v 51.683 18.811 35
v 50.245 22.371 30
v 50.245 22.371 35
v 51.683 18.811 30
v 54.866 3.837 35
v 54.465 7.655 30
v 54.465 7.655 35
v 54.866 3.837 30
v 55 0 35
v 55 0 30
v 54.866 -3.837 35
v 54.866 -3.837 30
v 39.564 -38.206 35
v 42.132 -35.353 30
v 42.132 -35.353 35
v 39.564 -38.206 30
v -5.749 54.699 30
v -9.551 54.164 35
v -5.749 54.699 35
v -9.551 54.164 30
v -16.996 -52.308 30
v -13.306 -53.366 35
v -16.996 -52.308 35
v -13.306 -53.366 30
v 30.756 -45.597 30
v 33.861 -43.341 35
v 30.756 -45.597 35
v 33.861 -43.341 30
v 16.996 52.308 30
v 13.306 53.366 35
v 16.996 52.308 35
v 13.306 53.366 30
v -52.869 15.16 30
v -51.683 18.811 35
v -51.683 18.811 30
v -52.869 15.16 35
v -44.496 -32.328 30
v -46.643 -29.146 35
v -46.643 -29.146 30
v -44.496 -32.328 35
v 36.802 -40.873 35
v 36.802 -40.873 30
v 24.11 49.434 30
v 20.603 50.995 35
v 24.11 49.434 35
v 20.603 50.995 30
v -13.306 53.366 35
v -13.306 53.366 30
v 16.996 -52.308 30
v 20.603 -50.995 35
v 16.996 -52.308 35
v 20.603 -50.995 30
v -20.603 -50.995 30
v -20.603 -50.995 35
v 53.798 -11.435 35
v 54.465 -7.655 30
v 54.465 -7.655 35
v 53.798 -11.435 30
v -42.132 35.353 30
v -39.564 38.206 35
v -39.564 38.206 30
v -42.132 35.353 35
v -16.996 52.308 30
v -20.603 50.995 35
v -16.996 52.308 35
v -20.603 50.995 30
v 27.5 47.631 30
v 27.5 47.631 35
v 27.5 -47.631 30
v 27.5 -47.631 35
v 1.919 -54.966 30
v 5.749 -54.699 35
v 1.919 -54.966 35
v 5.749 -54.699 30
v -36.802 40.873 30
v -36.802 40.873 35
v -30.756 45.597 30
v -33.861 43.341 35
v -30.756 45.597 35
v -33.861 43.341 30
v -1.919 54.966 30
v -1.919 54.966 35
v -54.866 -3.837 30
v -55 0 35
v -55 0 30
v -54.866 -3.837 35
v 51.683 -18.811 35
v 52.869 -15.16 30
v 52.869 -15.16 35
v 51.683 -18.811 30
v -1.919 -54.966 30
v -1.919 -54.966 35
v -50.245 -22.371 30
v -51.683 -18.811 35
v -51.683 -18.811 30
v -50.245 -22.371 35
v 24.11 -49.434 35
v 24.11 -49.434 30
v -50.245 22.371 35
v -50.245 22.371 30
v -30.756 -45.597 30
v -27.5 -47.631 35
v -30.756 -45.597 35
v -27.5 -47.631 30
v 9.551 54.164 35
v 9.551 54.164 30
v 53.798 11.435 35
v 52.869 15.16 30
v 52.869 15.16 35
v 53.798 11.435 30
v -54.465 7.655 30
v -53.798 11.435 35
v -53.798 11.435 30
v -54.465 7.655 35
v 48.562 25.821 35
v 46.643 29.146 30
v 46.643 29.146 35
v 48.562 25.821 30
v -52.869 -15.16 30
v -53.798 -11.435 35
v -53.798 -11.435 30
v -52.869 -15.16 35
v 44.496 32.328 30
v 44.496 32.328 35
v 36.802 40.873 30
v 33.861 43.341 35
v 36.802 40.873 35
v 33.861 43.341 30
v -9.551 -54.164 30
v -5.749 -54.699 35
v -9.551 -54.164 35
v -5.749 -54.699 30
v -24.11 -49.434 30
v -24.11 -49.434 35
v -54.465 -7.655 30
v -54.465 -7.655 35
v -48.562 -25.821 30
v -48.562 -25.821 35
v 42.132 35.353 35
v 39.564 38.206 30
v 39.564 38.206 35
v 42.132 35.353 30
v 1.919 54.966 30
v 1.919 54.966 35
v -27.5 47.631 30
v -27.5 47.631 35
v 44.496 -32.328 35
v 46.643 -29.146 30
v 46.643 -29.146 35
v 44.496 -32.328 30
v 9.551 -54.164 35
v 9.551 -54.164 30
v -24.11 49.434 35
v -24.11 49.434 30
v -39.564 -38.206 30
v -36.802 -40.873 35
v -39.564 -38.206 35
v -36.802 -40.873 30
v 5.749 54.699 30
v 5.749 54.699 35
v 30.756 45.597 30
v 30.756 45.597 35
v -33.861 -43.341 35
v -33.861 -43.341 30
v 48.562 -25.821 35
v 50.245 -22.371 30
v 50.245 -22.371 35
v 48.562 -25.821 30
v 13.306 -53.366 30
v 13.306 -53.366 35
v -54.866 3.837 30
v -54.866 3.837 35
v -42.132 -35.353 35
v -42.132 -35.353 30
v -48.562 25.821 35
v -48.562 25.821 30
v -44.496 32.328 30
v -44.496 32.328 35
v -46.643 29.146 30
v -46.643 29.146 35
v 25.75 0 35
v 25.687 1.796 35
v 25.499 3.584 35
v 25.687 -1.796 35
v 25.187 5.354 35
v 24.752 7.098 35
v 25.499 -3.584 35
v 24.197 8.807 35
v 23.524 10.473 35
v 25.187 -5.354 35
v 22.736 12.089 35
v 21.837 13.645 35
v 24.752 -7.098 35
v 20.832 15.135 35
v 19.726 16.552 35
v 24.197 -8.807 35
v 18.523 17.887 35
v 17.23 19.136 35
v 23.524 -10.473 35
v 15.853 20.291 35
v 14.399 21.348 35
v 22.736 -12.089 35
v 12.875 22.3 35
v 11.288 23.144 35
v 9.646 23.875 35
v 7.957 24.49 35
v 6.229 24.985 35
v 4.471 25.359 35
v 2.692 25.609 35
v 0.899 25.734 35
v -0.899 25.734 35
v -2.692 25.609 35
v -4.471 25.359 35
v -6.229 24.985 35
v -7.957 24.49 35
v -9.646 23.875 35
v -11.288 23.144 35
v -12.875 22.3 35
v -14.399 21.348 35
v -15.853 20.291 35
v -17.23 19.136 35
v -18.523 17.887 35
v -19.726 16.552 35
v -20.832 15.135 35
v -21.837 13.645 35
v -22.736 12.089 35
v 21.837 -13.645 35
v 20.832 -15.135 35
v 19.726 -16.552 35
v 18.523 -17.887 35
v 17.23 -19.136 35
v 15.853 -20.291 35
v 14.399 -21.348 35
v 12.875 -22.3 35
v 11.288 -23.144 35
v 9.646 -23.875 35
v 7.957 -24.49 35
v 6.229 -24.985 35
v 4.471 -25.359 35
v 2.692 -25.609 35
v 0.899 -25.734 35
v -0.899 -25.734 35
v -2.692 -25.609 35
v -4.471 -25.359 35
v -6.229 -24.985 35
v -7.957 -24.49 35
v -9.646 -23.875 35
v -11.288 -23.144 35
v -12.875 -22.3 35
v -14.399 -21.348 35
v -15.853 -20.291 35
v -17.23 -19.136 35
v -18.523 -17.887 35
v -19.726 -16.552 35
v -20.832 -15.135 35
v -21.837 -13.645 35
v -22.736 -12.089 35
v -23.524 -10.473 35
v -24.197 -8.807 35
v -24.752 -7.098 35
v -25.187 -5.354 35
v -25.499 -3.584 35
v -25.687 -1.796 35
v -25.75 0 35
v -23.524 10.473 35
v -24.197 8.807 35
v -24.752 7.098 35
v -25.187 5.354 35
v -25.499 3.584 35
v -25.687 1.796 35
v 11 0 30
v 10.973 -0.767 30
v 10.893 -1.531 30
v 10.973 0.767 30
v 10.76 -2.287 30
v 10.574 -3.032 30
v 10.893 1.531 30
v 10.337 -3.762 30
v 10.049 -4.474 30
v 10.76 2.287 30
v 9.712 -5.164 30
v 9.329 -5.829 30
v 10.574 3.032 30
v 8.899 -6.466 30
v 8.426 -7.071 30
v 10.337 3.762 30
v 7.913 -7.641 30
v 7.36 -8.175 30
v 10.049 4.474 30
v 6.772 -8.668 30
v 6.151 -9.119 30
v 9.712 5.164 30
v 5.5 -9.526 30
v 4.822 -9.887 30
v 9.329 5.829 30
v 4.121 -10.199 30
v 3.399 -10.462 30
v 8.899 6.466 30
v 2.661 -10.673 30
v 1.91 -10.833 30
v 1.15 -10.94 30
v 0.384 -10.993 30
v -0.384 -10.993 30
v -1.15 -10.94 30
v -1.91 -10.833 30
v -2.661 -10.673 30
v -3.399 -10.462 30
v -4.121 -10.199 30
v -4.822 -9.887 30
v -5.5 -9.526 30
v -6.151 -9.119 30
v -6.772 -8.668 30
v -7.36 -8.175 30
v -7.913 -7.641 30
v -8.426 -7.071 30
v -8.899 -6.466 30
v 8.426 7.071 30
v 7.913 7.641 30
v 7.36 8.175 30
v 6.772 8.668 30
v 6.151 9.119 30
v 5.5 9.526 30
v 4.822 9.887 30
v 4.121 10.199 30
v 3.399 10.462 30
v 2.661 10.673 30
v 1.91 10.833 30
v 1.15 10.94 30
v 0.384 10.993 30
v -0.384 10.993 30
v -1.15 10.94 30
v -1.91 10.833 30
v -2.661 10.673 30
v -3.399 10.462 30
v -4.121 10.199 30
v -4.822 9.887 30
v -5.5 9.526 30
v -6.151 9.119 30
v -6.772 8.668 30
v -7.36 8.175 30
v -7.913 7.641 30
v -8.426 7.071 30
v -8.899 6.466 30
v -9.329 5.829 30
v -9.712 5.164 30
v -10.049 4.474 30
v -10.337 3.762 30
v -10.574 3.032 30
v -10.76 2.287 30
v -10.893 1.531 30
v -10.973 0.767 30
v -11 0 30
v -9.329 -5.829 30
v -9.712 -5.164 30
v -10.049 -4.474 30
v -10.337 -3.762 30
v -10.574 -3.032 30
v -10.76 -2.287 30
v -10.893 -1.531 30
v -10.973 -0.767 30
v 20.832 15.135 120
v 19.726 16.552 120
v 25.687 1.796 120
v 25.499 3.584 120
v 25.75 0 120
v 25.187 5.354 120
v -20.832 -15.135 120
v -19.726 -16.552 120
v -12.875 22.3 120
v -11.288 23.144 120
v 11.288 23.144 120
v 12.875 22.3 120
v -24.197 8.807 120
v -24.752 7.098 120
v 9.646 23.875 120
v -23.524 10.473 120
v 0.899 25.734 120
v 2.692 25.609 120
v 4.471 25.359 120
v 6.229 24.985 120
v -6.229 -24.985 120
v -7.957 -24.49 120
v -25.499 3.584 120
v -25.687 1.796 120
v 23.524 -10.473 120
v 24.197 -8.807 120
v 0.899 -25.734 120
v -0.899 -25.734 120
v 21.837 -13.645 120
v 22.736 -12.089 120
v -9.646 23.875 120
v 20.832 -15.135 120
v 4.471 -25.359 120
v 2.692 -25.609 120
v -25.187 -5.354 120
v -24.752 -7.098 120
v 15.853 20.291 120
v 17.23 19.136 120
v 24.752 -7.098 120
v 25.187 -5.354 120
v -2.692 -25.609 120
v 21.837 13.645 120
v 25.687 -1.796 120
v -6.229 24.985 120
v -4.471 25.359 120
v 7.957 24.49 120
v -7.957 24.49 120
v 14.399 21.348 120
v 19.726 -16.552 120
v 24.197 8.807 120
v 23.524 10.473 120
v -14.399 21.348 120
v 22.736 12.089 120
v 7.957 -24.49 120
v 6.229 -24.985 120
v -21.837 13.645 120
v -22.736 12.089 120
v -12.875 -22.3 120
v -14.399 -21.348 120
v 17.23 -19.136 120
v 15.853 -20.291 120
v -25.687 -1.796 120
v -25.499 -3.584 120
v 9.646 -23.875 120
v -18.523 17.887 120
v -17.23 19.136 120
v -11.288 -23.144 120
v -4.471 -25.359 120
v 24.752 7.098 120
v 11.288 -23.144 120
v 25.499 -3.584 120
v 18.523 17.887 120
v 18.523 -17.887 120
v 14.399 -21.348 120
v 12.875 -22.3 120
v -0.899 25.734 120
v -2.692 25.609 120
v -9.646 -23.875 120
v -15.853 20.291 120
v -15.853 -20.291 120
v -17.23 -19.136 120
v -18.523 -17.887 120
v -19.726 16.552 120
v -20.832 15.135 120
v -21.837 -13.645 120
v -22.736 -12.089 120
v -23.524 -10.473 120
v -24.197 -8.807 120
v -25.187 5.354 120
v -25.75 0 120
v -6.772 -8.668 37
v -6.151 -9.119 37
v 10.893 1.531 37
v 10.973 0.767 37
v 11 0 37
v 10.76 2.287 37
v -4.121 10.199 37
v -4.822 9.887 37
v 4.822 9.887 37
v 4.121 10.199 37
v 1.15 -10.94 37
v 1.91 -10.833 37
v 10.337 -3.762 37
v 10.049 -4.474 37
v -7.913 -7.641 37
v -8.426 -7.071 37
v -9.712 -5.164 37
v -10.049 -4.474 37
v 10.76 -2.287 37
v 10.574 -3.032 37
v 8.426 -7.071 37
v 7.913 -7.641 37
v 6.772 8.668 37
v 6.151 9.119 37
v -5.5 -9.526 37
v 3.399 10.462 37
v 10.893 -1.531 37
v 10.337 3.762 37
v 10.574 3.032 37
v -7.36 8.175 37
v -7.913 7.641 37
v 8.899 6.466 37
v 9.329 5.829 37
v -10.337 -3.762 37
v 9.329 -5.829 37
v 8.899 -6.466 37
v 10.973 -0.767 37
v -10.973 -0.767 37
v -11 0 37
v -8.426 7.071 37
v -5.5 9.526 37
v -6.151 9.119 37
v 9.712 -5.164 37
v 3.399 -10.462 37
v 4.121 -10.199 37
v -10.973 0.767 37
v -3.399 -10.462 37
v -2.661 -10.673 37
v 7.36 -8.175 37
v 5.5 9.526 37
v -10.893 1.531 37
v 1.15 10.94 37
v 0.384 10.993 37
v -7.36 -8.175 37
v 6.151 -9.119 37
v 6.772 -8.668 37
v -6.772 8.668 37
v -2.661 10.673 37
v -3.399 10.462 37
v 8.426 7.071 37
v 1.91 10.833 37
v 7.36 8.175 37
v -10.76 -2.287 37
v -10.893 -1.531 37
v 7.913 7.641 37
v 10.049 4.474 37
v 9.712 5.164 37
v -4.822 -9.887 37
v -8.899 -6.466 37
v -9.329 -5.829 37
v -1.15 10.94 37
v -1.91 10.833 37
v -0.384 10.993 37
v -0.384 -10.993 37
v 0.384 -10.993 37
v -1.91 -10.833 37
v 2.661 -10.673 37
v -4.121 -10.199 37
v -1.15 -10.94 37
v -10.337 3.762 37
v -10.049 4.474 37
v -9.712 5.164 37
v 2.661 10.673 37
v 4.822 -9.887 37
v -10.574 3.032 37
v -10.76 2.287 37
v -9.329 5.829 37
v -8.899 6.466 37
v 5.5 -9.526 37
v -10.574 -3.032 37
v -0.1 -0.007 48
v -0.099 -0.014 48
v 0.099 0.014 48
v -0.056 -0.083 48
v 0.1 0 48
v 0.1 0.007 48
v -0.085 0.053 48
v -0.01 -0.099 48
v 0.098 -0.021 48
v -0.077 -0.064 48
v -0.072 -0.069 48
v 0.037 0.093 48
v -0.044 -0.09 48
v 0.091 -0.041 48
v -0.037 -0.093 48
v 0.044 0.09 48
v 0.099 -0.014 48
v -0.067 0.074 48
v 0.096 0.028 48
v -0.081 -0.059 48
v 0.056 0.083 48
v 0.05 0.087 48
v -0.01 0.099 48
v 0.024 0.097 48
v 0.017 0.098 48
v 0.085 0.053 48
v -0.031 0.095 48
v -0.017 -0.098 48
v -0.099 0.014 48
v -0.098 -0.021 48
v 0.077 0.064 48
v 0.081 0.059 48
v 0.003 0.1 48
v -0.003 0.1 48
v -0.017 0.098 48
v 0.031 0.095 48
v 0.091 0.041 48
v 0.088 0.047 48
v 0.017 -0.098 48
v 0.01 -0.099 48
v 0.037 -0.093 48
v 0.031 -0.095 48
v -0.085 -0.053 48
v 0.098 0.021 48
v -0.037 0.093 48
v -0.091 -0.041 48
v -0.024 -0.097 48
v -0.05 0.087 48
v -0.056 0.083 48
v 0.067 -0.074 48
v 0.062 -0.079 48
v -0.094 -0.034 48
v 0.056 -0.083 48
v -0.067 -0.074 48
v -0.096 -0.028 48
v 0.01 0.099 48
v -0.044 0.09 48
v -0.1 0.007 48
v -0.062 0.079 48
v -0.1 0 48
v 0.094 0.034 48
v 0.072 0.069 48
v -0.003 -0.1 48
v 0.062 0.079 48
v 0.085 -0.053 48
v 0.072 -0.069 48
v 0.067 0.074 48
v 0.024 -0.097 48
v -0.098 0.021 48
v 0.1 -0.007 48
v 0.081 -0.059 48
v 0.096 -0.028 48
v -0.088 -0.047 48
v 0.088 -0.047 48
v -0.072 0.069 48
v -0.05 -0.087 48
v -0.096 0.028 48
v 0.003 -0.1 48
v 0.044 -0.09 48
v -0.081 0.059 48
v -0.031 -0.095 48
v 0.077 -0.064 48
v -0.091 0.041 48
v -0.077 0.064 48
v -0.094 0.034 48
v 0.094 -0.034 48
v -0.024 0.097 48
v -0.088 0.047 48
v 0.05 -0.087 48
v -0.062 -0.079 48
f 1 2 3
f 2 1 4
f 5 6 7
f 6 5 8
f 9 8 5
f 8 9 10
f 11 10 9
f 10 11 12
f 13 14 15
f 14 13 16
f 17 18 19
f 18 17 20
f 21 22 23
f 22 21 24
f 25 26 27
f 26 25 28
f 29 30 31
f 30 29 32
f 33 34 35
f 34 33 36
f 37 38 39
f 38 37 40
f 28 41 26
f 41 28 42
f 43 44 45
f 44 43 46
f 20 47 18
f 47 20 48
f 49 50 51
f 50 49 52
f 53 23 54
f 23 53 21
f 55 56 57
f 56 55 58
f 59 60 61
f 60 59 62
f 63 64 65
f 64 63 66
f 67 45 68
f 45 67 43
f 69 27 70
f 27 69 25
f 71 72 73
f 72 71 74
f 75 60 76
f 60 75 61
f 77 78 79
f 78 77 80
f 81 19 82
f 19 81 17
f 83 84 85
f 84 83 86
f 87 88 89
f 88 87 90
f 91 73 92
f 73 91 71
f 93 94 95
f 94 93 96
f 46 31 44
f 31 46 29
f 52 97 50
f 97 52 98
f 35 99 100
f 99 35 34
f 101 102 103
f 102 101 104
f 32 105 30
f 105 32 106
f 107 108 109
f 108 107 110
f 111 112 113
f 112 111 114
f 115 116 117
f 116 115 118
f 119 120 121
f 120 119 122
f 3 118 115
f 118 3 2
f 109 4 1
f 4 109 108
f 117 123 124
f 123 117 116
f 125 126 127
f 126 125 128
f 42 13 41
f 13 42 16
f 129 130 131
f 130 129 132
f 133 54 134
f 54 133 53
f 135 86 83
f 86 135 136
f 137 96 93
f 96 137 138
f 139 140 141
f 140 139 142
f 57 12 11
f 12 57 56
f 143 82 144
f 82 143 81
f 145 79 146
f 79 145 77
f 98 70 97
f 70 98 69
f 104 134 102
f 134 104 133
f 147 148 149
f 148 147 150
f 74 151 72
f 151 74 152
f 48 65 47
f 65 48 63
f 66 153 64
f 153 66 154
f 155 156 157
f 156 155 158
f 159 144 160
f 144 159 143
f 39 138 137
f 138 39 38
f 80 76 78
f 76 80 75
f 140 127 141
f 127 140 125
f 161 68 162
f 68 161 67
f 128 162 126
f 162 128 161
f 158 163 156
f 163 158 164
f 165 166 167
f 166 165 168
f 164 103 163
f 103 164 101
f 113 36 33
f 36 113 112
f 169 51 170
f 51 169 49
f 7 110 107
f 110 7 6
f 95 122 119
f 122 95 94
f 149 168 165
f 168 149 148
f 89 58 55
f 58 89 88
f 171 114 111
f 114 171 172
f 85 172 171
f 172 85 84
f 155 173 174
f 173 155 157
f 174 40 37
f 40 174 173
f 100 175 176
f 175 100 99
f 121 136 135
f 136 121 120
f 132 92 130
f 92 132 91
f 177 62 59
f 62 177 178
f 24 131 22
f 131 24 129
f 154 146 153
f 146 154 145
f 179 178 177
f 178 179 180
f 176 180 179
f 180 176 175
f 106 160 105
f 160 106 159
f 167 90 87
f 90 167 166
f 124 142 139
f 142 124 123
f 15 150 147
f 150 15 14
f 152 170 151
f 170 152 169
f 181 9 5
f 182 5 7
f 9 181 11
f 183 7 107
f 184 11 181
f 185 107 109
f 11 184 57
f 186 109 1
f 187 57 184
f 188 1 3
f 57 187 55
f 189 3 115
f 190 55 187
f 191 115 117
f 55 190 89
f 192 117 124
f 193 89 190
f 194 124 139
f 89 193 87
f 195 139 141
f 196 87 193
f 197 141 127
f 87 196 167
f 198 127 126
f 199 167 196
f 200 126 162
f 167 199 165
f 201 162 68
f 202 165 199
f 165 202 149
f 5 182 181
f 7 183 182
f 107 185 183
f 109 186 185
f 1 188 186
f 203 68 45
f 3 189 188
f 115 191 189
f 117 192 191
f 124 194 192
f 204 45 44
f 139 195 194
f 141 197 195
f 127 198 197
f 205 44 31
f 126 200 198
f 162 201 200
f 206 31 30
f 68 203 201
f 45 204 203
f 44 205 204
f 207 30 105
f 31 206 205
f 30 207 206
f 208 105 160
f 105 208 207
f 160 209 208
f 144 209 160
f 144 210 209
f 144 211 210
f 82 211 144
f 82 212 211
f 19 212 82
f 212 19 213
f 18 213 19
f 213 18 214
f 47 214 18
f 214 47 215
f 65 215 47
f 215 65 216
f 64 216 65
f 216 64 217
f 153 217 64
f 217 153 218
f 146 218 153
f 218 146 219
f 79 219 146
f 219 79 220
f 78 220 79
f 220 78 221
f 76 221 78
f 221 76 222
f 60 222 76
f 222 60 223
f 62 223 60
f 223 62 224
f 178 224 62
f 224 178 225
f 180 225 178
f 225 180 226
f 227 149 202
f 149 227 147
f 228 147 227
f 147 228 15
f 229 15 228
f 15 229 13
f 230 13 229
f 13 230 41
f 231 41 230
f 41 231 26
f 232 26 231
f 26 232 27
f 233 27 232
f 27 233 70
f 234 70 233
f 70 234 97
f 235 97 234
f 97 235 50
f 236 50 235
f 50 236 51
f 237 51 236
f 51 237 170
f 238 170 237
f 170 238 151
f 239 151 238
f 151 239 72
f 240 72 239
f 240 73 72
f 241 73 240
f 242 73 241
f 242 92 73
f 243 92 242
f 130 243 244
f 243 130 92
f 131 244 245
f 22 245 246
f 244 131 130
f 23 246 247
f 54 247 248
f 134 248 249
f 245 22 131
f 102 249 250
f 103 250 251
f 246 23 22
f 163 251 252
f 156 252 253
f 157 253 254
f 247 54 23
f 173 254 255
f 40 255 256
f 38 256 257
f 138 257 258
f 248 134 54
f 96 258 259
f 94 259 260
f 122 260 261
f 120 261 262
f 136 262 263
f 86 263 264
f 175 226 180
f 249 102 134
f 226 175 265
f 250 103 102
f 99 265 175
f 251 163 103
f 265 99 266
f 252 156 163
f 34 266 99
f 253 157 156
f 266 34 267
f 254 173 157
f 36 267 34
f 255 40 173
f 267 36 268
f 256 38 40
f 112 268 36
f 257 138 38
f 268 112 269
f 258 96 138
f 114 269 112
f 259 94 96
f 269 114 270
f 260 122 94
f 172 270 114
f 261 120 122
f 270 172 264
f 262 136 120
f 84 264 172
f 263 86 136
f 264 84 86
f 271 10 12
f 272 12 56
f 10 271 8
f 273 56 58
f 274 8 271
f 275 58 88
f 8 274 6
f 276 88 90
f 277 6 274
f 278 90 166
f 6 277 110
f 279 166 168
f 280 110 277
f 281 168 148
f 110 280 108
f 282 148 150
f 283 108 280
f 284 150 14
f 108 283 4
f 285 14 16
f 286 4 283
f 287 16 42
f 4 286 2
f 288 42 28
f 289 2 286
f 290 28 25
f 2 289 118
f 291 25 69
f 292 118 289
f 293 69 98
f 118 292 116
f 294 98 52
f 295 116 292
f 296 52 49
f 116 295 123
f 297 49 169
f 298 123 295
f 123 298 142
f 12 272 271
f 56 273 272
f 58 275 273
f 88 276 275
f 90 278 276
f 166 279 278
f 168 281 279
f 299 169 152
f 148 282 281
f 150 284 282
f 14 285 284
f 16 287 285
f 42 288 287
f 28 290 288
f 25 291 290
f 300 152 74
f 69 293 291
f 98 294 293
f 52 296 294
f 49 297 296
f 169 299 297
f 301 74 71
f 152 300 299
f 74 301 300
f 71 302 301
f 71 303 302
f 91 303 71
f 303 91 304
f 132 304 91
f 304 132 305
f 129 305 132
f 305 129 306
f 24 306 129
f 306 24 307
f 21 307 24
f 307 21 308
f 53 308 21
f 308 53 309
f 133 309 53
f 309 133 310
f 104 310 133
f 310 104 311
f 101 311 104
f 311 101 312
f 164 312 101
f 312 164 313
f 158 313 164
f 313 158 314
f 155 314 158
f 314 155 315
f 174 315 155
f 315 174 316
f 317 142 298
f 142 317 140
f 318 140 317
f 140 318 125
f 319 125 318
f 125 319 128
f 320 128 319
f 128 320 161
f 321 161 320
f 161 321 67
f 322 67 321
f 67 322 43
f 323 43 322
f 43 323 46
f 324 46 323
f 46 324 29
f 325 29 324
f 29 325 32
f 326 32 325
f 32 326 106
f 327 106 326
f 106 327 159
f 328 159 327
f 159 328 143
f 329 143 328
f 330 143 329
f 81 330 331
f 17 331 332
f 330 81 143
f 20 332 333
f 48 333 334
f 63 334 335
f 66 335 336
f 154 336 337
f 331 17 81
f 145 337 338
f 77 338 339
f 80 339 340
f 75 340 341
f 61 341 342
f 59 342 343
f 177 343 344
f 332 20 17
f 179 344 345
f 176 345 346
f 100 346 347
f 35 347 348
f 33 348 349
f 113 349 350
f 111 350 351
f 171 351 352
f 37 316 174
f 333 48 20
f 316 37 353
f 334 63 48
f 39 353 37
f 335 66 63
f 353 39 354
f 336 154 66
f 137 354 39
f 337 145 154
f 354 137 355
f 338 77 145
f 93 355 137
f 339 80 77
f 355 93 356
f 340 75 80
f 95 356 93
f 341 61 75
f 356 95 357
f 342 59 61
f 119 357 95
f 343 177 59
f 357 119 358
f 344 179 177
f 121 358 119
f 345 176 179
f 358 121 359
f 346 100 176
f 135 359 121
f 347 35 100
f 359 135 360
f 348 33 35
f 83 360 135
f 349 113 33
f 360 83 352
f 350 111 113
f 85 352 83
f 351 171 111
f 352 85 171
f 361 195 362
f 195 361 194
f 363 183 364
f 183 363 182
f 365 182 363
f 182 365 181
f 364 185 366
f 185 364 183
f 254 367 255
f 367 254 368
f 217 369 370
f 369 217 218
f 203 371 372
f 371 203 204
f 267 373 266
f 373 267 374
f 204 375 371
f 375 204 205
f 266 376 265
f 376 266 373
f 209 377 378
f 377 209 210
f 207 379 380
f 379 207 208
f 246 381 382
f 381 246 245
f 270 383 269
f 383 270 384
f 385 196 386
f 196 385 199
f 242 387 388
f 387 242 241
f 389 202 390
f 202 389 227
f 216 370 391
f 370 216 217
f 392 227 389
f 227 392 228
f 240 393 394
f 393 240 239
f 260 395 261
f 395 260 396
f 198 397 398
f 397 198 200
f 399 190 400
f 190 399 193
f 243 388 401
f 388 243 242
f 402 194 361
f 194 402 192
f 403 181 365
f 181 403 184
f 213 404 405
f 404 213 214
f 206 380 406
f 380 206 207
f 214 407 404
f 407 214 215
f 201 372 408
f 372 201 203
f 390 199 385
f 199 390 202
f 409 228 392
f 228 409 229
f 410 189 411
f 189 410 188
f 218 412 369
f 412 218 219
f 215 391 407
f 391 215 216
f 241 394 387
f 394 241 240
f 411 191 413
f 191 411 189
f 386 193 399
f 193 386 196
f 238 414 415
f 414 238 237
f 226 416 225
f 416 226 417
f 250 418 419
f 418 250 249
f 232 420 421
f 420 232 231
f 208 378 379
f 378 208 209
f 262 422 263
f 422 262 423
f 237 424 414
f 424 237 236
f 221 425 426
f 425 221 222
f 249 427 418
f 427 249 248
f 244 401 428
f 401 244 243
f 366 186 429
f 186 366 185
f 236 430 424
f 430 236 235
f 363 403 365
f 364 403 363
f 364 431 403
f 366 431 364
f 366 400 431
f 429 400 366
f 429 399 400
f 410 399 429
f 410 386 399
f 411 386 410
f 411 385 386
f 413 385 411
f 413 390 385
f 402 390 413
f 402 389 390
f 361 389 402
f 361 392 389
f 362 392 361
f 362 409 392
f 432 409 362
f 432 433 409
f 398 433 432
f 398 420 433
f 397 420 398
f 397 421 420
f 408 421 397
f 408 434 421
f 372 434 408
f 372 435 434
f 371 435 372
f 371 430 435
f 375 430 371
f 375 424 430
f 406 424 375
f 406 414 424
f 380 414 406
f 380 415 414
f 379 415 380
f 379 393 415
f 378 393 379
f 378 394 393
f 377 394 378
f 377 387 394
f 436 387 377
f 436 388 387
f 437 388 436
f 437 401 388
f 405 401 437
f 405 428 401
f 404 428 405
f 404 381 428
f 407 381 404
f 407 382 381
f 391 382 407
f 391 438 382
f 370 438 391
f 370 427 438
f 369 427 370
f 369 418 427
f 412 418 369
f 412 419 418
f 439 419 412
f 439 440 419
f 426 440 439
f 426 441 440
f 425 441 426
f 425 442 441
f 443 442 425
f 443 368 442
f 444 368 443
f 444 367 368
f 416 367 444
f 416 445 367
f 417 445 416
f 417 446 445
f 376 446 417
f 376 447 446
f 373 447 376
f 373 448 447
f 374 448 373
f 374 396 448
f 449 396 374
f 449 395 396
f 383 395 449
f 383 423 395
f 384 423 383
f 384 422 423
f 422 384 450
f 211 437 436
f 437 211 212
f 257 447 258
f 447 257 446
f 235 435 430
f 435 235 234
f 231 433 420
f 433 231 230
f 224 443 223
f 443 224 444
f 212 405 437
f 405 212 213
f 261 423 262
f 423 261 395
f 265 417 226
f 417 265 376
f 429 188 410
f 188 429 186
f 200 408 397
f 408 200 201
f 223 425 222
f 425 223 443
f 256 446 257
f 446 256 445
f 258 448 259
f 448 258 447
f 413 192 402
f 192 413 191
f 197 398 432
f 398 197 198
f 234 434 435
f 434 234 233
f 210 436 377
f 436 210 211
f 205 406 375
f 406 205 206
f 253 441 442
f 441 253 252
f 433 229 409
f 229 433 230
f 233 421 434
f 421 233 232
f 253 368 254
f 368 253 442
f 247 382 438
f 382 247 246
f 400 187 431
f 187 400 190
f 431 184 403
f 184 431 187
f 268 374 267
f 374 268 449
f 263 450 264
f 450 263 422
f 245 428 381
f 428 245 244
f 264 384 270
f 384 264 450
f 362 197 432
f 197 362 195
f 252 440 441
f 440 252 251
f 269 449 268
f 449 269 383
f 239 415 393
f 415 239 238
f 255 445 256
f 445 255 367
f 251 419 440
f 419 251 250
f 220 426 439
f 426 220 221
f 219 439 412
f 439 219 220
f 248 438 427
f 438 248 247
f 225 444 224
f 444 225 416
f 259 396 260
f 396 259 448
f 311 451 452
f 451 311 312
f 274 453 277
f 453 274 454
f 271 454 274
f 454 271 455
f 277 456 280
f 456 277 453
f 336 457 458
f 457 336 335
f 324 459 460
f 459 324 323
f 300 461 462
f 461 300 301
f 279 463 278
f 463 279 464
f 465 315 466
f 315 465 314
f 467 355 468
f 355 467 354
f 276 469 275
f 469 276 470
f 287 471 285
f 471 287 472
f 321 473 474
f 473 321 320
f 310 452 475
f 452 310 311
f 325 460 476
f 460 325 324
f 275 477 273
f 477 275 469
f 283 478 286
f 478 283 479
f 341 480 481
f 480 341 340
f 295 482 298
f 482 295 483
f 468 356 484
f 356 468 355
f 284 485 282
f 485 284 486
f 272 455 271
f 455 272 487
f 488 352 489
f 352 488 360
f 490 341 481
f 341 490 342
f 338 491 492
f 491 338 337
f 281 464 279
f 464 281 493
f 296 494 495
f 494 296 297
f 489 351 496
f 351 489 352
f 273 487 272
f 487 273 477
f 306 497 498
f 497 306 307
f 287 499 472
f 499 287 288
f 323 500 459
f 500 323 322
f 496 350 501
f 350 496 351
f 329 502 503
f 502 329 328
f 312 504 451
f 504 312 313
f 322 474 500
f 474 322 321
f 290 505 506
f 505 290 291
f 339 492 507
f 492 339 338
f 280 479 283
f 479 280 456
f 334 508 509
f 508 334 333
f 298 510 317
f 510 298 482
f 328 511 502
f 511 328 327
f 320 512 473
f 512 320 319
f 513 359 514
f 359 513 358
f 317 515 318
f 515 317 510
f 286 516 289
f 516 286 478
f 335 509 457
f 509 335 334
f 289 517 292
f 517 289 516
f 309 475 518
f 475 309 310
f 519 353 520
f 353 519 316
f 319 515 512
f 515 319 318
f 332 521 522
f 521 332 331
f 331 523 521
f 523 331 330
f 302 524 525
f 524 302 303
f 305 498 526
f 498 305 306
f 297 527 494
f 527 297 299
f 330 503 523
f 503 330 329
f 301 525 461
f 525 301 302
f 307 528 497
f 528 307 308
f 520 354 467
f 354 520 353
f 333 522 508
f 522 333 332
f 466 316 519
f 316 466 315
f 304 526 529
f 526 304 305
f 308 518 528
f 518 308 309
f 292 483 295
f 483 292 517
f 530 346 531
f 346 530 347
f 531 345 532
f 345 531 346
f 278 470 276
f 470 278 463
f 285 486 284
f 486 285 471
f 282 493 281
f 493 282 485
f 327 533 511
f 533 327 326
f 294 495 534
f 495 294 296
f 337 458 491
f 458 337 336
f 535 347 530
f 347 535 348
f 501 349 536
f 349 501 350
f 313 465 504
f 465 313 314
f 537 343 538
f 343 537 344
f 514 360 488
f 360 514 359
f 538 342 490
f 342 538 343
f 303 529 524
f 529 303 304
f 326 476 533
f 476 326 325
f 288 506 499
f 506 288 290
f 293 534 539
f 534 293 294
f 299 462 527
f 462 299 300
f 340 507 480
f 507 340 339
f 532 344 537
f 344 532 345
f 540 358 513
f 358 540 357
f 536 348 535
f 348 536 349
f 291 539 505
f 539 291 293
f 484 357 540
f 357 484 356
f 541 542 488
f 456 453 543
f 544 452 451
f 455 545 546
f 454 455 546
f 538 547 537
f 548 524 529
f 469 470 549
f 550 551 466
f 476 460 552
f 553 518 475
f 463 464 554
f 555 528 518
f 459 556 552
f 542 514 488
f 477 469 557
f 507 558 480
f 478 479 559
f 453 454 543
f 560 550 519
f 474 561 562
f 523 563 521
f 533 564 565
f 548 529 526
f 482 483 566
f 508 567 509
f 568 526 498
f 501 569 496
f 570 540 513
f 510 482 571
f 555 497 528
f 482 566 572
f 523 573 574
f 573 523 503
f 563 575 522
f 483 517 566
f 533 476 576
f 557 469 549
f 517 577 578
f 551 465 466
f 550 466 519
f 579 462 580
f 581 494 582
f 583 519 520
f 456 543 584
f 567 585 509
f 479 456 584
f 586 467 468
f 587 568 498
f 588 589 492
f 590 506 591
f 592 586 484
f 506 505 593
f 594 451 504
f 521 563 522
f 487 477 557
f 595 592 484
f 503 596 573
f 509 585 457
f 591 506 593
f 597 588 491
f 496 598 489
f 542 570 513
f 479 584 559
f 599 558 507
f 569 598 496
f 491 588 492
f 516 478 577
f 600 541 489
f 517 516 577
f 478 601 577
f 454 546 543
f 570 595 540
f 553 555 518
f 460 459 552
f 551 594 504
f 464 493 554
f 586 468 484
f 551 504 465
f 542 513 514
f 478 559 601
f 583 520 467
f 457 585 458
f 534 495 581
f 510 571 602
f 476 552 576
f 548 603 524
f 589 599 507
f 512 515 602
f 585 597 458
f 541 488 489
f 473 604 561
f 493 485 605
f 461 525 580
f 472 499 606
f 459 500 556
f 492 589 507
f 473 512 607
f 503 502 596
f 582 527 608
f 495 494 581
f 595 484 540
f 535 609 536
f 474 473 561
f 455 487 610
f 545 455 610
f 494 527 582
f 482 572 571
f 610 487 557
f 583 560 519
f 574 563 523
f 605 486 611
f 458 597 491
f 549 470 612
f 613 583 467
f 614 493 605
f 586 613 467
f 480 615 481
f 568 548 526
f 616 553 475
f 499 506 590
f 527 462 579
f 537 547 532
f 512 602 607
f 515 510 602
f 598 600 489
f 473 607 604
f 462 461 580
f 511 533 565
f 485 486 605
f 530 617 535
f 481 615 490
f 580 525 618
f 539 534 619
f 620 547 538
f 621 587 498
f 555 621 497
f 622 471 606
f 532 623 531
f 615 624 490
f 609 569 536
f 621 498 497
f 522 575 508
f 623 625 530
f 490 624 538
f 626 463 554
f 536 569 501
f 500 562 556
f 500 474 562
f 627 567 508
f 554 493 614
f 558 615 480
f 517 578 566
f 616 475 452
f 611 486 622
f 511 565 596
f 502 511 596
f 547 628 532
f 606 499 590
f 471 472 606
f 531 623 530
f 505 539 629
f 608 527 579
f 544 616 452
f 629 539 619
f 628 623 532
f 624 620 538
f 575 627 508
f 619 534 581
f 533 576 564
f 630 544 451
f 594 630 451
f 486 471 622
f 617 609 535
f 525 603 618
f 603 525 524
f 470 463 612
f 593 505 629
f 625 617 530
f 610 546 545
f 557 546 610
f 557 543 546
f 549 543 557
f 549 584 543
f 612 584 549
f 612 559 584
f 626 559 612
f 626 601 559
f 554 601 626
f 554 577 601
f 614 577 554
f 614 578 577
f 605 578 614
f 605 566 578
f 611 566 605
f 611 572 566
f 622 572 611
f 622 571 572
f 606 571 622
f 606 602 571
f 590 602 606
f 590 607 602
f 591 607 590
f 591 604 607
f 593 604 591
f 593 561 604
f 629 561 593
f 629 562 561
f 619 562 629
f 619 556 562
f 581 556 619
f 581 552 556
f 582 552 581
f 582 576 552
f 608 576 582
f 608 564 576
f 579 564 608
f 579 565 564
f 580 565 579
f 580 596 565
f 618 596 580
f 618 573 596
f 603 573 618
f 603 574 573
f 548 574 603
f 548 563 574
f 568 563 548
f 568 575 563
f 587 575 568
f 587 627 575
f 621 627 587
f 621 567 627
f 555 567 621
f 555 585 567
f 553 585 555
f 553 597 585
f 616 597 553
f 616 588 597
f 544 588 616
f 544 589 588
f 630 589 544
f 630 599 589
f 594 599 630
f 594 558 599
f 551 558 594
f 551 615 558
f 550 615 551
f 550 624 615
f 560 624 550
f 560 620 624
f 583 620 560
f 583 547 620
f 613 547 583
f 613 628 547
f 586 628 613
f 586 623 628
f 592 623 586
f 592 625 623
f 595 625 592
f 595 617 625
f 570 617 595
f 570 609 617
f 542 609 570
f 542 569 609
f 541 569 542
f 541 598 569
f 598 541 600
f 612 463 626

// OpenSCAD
in_d=8;
in_r=in_d/2;
in_h=7;
out_d=22;
out_r=out_d/2;
out_h=in_h;
shoulder_d=15;
shoulder_r=shoulder_d/2;
shoulder_h=2.5;
base_d=110;
base_r=base_d/2;
spool_r=170;
base_h=3;

sat_d=12;
sat_r=sat_d/2;
sat_h=40;
guide_d=6;
guide_r=guide_d/2;
guide_h=12;

pin_d=3;
pin_r=pin_d/2;
pin_h=base_h+shoulder_h+in_h;

screw_r1=5/2;
screw_r2=9/2;
$fn=90;

display=30;
spool_base_h=5;
spool_center_h=90;
spool_center_d=51.5;
spool_center_r=spool_center_d/2;

module base() {
difference() {
    union(){
        hull(){
            cylinder(r=base_r,h=base_h);
            translate([spool_r,0,0])
            cylinder(r=sat_r,h=base_h);
        }
        translate([0,0,base_h])
        cylinder(r=shoulder_r,h=shoulder_h);
        translate([0,0,shoulder_h+base_h])
        cylinder(r=in_r,h=in_h);
    }
    cylinder(r=pin_r,h=pin_h);
    translate([base_r+screw_r1,0,0])
    cylinder(r1=screw_r1,r2=screw_r2,h=base_h);
    translate([spool_r-sat_d-sat_r,0,0])
    cylinder(r1=screw_r1,r2=screw_r2,h=base_h);
}
difference() {
    translate([spool_r,0,0])
    cylinder(r=sat_r,h=sat_h);
    hull() {
        translate([spool_r,-sat_d,sat_h-sat_r])
        rotate([-90,0,0])
        cylinder(r=guide_r,h=sat_d*2);
        translate([spool_r,-sat_d,sat_h-sat_r-guide_h])
        rotate([-90,0,0])
        cylinder(r=guide_r,h=sat_d*2);
    }
}
}

module spool() {
translate([0,0,display]){
    difference() {
        union() {
            cylinder(r=base_r,h=spool_base_h);
            cylinder(r=spool_center_r,h=spool_center_h);
        }
    #cylinder(r=out_r,h=out_h);
    translate([0,0,out_h])
    #cylinder(r1=out_r,r2=0.1,h=out_r);
    }
}
}
spool();
